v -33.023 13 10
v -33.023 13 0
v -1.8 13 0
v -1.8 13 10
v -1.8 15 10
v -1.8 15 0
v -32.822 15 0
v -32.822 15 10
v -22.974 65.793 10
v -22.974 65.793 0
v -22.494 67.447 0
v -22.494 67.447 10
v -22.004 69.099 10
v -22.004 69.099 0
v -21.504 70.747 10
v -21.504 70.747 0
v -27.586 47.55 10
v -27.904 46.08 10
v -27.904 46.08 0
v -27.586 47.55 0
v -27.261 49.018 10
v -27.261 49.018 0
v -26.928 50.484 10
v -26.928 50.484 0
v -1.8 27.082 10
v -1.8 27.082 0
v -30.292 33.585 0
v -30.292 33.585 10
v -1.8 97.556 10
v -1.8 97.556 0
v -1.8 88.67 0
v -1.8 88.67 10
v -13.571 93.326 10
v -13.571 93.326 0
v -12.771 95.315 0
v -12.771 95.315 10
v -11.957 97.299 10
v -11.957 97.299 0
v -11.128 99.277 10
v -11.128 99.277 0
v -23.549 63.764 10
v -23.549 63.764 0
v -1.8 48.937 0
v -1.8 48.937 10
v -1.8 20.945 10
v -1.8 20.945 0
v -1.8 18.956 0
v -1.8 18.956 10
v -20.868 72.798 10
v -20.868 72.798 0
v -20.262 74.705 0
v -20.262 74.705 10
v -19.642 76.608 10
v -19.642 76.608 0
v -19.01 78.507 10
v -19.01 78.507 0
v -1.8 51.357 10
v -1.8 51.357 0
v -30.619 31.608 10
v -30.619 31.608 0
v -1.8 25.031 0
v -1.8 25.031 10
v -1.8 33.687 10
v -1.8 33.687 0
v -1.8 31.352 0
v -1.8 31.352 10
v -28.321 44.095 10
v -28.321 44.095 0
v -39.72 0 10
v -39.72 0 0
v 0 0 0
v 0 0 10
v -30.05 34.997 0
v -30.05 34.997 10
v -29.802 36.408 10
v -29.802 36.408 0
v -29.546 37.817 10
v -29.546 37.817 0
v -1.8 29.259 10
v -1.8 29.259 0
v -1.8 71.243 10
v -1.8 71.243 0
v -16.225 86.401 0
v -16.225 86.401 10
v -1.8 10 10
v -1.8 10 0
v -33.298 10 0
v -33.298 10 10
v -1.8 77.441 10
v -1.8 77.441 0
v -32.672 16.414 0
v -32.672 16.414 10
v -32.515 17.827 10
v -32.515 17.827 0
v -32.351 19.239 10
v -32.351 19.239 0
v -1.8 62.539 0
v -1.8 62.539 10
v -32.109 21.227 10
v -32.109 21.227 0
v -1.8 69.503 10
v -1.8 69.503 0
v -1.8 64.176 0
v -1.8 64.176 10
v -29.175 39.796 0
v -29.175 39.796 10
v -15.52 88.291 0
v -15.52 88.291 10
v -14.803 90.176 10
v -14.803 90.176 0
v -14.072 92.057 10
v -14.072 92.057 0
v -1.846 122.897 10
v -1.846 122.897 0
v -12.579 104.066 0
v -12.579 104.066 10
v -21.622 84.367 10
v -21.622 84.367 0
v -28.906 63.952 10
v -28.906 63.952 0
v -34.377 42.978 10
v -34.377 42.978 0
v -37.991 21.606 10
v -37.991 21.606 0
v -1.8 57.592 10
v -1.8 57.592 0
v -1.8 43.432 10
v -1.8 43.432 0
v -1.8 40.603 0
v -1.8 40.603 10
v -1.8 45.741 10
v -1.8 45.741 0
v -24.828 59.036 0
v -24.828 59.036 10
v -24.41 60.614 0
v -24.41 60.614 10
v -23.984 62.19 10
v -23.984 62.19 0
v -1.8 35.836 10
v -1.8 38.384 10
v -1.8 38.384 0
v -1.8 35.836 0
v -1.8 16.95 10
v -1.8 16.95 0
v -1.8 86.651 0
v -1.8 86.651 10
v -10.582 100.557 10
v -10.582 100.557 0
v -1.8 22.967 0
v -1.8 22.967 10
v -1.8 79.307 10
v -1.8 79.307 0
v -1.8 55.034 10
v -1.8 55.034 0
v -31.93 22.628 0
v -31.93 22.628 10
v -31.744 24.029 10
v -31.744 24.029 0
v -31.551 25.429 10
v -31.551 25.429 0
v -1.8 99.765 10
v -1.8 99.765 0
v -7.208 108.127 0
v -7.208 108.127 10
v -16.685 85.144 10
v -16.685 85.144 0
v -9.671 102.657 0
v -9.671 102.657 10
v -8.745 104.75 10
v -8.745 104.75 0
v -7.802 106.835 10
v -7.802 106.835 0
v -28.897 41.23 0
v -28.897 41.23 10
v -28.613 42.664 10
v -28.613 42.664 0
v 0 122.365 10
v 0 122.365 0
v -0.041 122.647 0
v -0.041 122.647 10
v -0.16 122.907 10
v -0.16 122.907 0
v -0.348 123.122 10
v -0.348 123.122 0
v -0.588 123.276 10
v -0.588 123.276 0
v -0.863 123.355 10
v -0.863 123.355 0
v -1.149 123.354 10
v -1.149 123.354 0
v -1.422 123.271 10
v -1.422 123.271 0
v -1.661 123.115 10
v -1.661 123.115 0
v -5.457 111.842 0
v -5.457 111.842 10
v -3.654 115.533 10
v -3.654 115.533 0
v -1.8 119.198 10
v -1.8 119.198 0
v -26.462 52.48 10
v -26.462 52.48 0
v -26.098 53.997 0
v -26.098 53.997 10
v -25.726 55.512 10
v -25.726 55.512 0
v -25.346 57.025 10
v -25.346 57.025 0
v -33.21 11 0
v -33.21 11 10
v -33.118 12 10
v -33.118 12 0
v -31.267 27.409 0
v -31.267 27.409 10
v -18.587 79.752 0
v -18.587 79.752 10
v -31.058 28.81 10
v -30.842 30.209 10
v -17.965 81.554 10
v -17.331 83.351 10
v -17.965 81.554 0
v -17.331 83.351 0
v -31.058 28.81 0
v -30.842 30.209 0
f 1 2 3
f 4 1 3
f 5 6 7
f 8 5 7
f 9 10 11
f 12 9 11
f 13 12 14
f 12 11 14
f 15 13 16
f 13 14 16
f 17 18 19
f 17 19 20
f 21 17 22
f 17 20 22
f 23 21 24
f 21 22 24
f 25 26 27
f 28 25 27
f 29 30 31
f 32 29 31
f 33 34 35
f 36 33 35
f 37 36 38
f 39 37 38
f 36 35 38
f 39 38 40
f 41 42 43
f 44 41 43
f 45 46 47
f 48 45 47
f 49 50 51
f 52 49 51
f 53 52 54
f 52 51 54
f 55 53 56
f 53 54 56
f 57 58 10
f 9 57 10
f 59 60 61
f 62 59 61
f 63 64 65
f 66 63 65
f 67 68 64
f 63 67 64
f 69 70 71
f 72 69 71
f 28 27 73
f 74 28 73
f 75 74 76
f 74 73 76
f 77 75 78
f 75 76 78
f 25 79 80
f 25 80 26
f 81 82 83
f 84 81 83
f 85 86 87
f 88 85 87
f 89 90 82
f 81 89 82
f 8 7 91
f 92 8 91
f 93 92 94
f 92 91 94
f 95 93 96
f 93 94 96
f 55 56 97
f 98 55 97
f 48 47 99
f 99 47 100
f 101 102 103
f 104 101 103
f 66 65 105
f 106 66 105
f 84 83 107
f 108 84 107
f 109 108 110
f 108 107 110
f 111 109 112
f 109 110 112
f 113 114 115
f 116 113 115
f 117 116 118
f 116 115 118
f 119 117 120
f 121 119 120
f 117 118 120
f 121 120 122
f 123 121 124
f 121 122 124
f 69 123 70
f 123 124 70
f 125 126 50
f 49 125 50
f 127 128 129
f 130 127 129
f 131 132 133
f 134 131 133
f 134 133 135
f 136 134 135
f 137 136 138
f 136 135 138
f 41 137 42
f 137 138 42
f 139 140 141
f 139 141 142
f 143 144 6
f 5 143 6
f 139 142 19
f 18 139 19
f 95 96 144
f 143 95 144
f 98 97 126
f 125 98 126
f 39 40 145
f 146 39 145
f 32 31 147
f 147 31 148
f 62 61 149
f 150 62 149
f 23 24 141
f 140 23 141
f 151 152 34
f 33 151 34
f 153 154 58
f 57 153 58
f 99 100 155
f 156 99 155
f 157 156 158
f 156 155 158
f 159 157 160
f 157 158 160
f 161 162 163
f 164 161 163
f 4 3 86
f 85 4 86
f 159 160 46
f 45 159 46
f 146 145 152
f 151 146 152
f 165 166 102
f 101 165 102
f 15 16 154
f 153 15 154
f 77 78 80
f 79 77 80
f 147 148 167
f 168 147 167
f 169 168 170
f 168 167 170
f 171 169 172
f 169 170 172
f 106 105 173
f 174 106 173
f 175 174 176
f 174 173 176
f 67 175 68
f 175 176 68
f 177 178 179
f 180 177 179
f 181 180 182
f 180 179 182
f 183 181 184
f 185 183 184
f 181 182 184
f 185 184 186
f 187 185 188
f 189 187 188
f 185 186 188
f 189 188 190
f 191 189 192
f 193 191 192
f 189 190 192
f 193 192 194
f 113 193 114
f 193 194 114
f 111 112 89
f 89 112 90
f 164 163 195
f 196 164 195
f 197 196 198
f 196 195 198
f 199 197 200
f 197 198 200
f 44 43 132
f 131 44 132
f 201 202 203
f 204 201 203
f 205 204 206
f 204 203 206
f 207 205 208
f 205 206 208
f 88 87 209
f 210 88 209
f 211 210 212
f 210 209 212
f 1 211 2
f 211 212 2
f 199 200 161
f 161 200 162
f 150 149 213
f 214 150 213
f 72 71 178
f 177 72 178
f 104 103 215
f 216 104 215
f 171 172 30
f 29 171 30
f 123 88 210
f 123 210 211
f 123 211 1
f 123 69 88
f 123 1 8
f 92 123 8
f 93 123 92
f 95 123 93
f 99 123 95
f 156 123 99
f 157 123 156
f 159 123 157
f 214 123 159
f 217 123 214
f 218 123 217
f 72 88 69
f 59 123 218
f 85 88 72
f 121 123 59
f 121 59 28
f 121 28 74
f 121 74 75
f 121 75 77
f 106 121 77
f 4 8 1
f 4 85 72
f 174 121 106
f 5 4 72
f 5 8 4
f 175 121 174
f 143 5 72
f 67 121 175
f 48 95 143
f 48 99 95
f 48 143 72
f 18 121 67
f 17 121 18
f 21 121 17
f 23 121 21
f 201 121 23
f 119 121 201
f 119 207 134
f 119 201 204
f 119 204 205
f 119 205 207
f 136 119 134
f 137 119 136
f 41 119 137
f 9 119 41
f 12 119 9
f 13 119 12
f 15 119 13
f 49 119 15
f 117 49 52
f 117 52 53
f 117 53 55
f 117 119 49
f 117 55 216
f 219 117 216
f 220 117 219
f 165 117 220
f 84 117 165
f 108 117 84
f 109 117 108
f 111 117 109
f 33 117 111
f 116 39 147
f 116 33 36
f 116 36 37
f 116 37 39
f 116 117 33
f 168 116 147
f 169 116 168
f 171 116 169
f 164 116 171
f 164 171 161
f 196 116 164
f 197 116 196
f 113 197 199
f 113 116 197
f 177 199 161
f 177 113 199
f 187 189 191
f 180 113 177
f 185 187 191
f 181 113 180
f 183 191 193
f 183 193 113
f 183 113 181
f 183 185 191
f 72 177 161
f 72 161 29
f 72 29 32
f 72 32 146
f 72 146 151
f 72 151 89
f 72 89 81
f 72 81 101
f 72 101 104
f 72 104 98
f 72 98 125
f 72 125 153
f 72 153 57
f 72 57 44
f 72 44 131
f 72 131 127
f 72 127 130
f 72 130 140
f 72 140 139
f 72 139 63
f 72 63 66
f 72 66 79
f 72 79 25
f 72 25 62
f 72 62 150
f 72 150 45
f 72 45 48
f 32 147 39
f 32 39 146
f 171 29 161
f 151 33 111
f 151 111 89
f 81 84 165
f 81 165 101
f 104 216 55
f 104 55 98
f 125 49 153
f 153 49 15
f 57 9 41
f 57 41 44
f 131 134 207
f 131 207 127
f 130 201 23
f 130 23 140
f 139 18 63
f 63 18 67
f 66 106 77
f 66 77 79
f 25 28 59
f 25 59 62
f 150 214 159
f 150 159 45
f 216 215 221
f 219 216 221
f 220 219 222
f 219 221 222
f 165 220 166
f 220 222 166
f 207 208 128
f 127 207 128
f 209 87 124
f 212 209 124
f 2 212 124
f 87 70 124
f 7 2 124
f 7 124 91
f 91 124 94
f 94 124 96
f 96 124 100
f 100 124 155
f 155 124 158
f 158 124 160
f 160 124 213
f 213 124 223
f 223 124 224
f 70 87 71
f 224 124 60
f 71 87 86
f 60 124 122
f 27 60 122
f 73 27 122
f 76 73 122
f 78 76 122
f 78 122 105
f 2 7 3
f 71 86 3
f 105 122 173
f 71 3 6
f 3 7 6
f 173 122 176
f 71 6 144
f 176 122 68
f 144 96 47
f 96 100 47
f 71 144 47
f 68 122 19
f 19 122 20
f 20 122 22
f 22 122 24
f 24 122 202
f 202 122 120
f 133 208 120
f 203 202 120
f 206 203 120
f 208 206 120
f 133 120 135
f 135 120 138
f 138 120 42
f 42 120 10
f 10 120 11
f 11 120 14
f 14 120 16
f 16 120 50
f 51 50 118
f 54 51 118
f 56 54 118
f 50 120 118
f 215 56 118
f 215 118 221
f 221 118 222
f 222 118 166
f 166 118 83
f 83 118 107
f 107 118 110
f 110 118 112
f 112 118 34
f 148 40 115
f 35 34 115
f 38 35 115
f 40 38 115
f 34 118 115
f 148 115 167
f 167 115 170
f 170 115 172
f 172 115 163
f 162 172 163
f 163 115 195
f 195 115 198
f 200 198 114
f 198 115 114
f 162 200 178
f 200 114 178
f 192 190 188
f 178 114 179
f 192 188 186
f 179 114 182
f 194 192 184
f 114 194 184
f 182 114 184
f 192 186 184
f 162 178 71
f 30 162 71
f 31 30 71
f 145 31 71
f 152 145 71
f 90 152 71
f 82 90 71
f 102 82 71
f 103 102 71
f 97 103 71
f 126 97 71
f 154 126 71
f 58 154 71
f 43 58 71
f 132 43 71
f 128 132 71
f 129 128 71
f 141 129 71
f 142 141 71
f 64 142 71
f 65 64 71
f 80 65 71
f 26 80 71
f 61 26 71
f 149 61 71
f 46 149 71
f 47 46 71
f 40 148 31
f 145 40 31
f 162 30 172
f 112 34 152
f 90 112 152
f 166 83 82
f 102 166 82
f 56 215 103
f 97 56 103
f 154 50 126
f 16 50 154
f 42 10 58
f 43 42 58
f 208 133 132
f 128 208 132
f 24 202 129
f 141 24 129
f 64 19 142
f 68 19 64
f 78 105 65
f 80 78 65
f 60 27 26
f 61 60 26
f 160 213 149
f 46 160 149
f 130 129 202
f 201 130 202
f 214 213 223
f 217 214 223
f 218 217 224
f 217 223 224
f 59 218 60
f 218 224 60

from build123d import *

# Parameters (mm, degrees)
BOSS_EXTRUDE4_DEPTH = 10
BOSS_EXTRUDE5_DEPTH = 10


with BuildPart() as part:
    # Sketch5 → Boss-Extrude4 (new body)
    with BuildSketch(Plane.XY):
        with BuildLine():
            Line((0, 0), (0, 122.364670388))
            ThreePointArc((0, 122.364670388), (-0.722776757, 123.325475922), (-1.846294547, 122.89738564))
            ThreePointArc((-1.846294547, 122.89738564), (-28.906490201, 63.952063235), (-39.720316086, 0))
            Line((-39.720316086, 0), (0, 0))
        make_face()
        with BuildLine():
            Line((-1.8, 10), (-33.298, 10))
            ThreePointArc((-33.298, 10), (-22.875707389, 66.135343677), (-1.8, 119.197717832))
            Line((-1.8, 119.197717832), (-1.8, 10))
        make_face(mode=Mode.SUBTRACT)
    extrude(amount=BOSS_EXTRUDE4_DEPTH)

    # Sketch8 → Boss-Extrude5 (add)
    with BuildSketch(Plane.XY):
        with BuildLine():
            Line((-33.02290127, 13), (-1.8, 13))
            Line((-1.8, 13), (-1.8, 15))
            Line((-1.8, 15), (-32.822260718, 15))
            ThreePointArc((-32.822260718, 15), (-32.924290216, 14.00017147), (-33.02290127, 13))
        make_face()
        with BuildLine():
            Line((-31.551287828, 25.428873475), (-1.8, 20.944756944))
            Line((-1.8, 20.944756944), (-1.8, 22.967345922))
            Line((-1.8, 22.967345922), (-31.267160482, 27.408638756))
            ThreePointArc((-31.267160482, 27.408638756), (-31.410907676, 26.418997727), (-31.551287828, 25.428873475))
        make_face()
        with BuildLine():
            Line((-32.351201095, 19.239482352), (-1.8, 16.950071453))
            Line((-1.8, 16.950071453), (-1.8, 18.955679124))
            Line((-1.8, 18.955679124), (-32.108897466, 21.226932551))
            ThreePointArc((-32.108897466, 21.226932551), (-32.231741124, 20.233413716), (-32.351201095, 19.239482352))
        make_face()
        with BuildLine():
            Line((-30.618838123, 31.608168854), (-1.8, 25.030709106))
            Line((-1.8, 25.030709106), (-1.8, 27.082138941))
            Line((-1.8, 27.082138941), (-30.292091958, 33.585023866))
            ThreePointArc((-30.292091958, 33.585023866), (-30.457149134, 32.596874717), (-30.618838123, 31.608168854))
        make_face()
        with BuildLine():
            Line((-29.545931615, 37.81700869), (-1.8, 29.258858956))
            Line((-1.8, 29.258858956), (-1.8, 31.351837274))
            Line((-1.8, 31.351837274), (-29.175137635, 39.795616712))
            ThreePointArc((-29.175137635, 39.795616712), (-29.3622281, 38.806630061), (-29.545931615, 37.81700869))
        make_face()
        with BuildLine():
            Line((-28.320844309, 44.095333315), (-1.8, 33.687092884))
            Line((-1.8, 33.687092884), (-1.8, 35.835600273))
            Line((-1.8, 35.835600273), (-27.903926427, 46.080219158))
            ThreePointArc((-27.903926427, 46.080219158), (-28.114096999, 45.088135758), (-28.320844309, 44.095333315))
        make_face()
        with BuildLine():
            Line((-26.927669735, 50.484015361), (-1.8, 38.383681924))
            Line((-1.8, 38.383681924), (-1.8, 40.603496684))
            Line((-1.8, 40.603496684), (-26.461878817, 52.479526575))
            ThreePointArc((-26.461878817, 52.479526575), (-26.696512847, 51.482176784), (-26.927669735, 50.484015361))
        make_face()
        with BuildLine():
            Line((-25.34575305, 57.025462495), (-1.8, 43.431924442))
            Line((-1.8, 43.431924442), (-1.8, 45.741299663))
            Line((-1.8, 45.741299663), (-24.827629625, 59.035712413))
            ThreePointArc((-24.827629625, 59.035712413), (-25.088465651, 58.031044767), (-25.34575305, 57.025462495))
        make_face()
        with BuildLine():
            Line((-23.548915199, 63.764175049), (-1.8, 48.936721808))
            Line((-1.8, 48.936721808), (-1.8, 51.357293007))
            Line((-1.8, 51.357293007), (-22.974243013, 65.792960042))
            ThreePointArc((-22.974243013, 65.792960042), (-23.26339795, 64.77908275), (-23.548915199, 63.764175049))
        make_face()
        with BuildLine():
            Line((-21.504437213, 70.747227787), (-1.8, 55.034267194))
            Line((-1.8, 55.034267194), (-1.8, 57.592312347))
            Line((-1.8, 57.592312347), (-20.868191149, 72.797909588))
            ThreePointArc((-20.868191149, 72.797909588), (-21.188186233, 71.773149512), (-21.504437213, 70.747227787))
        make_face()
        with BuildLine():
            Line((-19.009701273, 78.507124213), (-1.8, 62.539493808))
            Line((-1.8, 62.539493808), (-1.8, 64.176455444))
            Line((-1.8, 64.176455444), (-18.587222465, 79.752098484))
            ThreePointArc((-18.587222465, 79.752098484), (-18.799157777, 79.129847503), (-19.009701273, 78.507124213))
        make_face()
        with BuildLine():
            Line((-16.685267787, 85.144051641), (-1.8, 69.502691427))
            Line((-1.8, 69.502691427), (-1.8, 71.243382102))
            Line((-1.8, 71.243382102), (-16.22487287, 86.400961786))
            ThreePointArc((-16.22487287, 86.400961786), (-16.455785666, 85.772768735), (-16.685267787, 85.144051641))
        make_face()
        with BuildLine():
            Line((-14.072204317, 92.056761761), (-1.8, 77.440823569))
            Line((-1.8, 77.440823569), (-1.8, 79.306980252))
            Line((-1.8, 79.306980252), (-13.570797112, 93.325752969))
            ThreePointArc((-13.570797112, 93.325752969), (-13.822236892, 92.691548245), (-14.072204317, 92.056761761))
        make_face()
        with BuildLine():
            Line((-11.127713878, 99.276715969), (-1.8, 86.650543681))
            Line((-1.8, 86.650543681), (-1.8, 88.670070899))
            Line((-1.8, 88.670070899), (-10.581907863, 100.557429702))
            ThreePointArc((-10.581907863, 100.557429702), (-10.855568937, 99.917395903), (-11.127713878, 99.276715969))
        make_face()
        with BuildLine():
            Line((-7.801640698, 106.835271915), (-1.8, 97.555550659))
            Line((-1.8, 97.555550659), (-1.8, 99.765221681))
            Line((-1.8, 99.765221681), (-7.207784689, 108.126724319))
            ThreePointArc((-7.207784689, 108.126724319), (-7.505493193, 107.481357019), (-7.801640698, 106.835271915))
        make_face()
    extrude(amount=BOSS_EXTRUDE5_DEPTH)


solid = part.part
